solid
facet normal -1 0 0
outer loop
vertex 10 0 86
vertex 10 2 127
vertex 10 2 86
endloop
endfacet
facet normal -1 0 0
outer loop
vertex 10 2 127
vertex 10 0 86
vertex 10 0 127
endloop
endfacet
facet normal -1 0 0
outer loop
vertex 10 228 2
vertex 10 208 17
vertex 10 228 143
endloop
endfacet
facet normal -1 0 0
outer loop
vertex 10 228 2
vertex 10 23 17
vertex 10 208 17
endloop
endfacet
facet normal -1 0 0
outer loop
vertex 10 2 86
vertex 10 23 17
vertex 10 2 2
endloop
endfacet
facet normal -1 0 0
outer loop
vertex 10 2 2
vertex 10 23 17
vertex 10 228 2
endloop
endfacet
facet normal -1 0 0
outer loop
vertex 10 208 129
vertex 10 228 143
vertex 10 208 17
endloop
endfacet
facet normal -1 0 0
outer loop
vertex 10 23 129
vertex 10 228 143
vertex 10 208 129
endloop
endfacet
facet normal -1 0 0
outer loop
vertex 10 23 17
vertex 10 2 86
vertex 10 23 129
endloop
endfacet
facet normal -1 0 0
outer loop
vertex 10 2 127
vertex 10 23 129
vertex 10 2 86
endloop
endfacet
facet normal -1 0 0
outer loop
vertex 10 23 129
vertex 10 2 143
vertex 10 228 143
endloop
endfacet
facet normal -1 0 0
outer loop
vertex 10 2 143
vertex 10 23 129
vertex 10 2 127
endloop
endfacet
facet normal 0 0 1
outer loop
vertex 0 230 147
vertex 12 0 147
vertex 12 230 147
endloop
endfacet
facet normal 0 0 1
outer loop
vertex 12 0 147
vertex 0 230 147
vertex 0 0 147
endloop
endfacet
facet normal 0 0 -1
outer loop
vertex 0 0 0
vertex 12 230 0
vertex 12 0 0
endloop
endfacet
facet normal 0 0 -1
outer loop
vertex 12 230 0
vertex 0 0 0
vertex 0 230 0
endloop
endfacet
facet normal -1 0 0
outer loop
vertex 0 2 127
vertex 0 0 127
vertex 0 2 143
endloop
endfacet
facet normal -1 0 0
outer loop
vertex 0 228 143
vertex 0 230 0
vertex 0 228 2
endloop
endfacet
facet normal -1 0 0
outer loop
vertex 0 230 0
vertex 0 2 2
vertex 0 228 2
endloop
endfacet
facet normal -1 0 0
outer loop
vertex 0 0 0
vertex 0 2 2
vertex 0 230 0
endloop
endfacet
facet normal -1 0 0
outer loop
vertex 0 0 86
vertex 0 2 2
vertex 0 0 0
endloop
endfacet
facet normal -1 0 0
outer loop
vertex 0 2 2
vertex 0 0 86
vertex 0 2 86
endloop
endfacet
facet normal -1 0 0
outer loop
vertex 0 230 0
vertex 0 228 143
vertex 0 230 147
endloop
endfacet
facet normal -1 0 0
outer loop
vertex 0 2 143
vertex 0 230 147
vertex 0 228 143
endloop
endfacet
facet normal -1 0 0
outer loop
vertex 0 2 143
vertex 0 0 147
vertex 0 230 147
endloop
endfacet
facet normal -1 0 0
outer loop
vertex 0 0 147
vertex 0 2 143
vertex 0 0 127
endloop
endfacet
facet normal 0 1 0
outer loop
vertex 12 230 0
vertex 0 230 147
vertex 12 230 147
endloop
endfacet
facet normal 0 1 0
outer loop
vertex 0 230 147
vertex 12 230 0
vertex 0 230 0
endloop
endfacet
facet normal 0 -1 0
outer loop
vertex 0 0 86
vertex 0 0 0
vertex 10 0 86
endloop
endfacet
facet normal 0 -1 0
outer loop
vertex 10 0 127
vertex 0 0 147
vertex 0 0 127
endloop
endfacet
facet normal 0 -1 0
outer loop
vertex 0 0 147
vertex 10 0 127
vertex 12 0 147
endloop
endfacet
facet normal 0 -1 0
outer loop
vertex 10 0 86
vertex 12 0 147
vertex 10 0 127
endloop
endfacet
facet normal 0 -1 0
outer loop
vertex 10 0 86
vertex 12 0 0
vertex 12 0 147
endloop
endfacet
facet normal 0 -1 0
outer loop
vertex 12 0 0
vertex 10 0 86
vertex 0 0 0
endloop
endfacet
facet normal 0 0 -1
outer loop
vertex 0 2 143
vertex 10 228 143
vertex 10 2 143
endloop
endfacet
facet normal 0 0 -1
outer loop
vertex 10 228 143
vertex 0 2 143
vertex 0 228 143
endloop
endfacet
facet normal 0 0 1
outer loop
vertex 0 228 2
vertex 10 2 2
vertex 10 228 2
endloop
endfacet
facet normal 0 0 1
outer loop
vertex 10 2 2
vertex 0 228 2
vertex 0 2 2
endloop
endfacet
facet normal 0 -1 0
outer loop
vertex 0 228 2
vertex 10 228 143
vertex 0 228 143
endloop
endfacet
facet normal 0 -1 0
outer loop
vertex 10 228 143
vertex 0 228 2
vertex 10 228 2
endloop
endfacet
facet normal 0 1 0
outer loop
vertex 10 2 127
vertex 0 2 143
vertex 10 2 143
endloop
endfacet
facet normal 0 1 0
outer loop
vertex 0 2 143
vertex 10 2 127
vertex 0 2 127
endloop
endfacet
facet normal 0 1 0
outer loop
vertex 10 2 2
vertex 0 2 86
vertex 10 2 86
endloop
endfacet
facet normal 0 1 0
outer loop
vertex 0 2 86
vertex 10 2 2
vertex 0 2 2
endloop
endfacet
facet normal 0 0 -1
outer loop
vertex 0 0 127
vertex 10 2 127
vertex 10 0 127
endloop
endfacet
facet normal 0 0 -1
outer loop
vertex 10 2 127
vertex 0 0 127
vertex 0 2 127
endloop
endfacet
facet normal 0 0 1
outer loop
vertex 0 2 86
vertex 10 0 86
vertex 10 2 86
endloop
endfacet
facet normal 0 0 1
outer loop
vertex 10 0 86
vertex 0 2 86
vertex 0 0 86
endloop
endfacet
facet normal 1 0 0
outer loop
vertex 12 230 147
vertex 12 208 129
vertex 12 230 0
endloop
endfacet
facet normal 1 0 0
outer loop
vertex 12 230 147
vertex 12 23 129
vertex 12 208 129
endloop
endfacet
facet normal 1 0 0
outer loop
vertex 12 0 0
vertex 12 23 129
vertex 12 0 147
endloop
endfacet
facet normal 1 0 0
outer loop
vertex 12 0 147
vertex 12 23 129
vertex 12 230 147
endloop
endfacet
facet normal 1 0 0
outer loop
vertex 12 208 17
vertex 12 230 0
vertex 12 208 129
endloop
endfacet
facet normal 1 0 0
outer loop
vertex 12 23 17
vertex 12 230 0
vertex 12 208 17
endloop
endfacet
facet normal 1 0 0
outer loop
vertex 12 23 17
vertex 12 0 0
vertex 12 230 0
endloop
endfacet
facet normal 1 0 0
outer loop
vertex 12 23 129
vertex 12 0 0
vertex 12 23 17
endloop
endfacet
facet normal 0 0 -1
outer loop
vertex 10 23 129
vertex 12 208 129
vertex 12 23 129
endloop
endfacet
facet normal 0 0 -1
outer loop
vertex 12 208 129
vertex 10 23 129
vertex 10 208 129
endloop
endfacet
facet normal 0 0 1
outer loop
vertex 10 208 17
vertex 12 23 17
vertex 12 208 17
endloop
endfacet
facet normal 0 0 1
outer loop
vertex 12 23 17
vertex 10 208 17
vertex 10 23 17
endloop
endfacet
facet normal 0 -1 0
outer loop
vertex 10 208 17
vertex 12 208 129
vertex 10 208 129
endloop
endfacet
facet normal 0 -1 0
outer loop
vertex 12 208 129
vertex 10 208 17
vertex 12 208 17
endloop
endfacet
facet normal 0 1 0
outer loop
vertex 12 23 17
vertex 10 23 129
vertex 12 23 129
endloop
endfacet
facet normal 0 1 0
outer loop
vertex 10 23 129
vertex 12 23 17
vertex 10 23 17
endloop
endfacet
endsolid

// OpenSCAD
union(){
    difference(){
        cube([10,230,147]);
        translate([0,2,2]){
            cube([13,226,141]);
        }
        translate([0,0,86]){
            cube([13,5,41]);
        }
    }
    difference(){
        translate([10,0,0]){
            cube([2,230,147]);
        }
        translate([10,23,17]){
            cube([2,185,112]);
        }
    }
}
